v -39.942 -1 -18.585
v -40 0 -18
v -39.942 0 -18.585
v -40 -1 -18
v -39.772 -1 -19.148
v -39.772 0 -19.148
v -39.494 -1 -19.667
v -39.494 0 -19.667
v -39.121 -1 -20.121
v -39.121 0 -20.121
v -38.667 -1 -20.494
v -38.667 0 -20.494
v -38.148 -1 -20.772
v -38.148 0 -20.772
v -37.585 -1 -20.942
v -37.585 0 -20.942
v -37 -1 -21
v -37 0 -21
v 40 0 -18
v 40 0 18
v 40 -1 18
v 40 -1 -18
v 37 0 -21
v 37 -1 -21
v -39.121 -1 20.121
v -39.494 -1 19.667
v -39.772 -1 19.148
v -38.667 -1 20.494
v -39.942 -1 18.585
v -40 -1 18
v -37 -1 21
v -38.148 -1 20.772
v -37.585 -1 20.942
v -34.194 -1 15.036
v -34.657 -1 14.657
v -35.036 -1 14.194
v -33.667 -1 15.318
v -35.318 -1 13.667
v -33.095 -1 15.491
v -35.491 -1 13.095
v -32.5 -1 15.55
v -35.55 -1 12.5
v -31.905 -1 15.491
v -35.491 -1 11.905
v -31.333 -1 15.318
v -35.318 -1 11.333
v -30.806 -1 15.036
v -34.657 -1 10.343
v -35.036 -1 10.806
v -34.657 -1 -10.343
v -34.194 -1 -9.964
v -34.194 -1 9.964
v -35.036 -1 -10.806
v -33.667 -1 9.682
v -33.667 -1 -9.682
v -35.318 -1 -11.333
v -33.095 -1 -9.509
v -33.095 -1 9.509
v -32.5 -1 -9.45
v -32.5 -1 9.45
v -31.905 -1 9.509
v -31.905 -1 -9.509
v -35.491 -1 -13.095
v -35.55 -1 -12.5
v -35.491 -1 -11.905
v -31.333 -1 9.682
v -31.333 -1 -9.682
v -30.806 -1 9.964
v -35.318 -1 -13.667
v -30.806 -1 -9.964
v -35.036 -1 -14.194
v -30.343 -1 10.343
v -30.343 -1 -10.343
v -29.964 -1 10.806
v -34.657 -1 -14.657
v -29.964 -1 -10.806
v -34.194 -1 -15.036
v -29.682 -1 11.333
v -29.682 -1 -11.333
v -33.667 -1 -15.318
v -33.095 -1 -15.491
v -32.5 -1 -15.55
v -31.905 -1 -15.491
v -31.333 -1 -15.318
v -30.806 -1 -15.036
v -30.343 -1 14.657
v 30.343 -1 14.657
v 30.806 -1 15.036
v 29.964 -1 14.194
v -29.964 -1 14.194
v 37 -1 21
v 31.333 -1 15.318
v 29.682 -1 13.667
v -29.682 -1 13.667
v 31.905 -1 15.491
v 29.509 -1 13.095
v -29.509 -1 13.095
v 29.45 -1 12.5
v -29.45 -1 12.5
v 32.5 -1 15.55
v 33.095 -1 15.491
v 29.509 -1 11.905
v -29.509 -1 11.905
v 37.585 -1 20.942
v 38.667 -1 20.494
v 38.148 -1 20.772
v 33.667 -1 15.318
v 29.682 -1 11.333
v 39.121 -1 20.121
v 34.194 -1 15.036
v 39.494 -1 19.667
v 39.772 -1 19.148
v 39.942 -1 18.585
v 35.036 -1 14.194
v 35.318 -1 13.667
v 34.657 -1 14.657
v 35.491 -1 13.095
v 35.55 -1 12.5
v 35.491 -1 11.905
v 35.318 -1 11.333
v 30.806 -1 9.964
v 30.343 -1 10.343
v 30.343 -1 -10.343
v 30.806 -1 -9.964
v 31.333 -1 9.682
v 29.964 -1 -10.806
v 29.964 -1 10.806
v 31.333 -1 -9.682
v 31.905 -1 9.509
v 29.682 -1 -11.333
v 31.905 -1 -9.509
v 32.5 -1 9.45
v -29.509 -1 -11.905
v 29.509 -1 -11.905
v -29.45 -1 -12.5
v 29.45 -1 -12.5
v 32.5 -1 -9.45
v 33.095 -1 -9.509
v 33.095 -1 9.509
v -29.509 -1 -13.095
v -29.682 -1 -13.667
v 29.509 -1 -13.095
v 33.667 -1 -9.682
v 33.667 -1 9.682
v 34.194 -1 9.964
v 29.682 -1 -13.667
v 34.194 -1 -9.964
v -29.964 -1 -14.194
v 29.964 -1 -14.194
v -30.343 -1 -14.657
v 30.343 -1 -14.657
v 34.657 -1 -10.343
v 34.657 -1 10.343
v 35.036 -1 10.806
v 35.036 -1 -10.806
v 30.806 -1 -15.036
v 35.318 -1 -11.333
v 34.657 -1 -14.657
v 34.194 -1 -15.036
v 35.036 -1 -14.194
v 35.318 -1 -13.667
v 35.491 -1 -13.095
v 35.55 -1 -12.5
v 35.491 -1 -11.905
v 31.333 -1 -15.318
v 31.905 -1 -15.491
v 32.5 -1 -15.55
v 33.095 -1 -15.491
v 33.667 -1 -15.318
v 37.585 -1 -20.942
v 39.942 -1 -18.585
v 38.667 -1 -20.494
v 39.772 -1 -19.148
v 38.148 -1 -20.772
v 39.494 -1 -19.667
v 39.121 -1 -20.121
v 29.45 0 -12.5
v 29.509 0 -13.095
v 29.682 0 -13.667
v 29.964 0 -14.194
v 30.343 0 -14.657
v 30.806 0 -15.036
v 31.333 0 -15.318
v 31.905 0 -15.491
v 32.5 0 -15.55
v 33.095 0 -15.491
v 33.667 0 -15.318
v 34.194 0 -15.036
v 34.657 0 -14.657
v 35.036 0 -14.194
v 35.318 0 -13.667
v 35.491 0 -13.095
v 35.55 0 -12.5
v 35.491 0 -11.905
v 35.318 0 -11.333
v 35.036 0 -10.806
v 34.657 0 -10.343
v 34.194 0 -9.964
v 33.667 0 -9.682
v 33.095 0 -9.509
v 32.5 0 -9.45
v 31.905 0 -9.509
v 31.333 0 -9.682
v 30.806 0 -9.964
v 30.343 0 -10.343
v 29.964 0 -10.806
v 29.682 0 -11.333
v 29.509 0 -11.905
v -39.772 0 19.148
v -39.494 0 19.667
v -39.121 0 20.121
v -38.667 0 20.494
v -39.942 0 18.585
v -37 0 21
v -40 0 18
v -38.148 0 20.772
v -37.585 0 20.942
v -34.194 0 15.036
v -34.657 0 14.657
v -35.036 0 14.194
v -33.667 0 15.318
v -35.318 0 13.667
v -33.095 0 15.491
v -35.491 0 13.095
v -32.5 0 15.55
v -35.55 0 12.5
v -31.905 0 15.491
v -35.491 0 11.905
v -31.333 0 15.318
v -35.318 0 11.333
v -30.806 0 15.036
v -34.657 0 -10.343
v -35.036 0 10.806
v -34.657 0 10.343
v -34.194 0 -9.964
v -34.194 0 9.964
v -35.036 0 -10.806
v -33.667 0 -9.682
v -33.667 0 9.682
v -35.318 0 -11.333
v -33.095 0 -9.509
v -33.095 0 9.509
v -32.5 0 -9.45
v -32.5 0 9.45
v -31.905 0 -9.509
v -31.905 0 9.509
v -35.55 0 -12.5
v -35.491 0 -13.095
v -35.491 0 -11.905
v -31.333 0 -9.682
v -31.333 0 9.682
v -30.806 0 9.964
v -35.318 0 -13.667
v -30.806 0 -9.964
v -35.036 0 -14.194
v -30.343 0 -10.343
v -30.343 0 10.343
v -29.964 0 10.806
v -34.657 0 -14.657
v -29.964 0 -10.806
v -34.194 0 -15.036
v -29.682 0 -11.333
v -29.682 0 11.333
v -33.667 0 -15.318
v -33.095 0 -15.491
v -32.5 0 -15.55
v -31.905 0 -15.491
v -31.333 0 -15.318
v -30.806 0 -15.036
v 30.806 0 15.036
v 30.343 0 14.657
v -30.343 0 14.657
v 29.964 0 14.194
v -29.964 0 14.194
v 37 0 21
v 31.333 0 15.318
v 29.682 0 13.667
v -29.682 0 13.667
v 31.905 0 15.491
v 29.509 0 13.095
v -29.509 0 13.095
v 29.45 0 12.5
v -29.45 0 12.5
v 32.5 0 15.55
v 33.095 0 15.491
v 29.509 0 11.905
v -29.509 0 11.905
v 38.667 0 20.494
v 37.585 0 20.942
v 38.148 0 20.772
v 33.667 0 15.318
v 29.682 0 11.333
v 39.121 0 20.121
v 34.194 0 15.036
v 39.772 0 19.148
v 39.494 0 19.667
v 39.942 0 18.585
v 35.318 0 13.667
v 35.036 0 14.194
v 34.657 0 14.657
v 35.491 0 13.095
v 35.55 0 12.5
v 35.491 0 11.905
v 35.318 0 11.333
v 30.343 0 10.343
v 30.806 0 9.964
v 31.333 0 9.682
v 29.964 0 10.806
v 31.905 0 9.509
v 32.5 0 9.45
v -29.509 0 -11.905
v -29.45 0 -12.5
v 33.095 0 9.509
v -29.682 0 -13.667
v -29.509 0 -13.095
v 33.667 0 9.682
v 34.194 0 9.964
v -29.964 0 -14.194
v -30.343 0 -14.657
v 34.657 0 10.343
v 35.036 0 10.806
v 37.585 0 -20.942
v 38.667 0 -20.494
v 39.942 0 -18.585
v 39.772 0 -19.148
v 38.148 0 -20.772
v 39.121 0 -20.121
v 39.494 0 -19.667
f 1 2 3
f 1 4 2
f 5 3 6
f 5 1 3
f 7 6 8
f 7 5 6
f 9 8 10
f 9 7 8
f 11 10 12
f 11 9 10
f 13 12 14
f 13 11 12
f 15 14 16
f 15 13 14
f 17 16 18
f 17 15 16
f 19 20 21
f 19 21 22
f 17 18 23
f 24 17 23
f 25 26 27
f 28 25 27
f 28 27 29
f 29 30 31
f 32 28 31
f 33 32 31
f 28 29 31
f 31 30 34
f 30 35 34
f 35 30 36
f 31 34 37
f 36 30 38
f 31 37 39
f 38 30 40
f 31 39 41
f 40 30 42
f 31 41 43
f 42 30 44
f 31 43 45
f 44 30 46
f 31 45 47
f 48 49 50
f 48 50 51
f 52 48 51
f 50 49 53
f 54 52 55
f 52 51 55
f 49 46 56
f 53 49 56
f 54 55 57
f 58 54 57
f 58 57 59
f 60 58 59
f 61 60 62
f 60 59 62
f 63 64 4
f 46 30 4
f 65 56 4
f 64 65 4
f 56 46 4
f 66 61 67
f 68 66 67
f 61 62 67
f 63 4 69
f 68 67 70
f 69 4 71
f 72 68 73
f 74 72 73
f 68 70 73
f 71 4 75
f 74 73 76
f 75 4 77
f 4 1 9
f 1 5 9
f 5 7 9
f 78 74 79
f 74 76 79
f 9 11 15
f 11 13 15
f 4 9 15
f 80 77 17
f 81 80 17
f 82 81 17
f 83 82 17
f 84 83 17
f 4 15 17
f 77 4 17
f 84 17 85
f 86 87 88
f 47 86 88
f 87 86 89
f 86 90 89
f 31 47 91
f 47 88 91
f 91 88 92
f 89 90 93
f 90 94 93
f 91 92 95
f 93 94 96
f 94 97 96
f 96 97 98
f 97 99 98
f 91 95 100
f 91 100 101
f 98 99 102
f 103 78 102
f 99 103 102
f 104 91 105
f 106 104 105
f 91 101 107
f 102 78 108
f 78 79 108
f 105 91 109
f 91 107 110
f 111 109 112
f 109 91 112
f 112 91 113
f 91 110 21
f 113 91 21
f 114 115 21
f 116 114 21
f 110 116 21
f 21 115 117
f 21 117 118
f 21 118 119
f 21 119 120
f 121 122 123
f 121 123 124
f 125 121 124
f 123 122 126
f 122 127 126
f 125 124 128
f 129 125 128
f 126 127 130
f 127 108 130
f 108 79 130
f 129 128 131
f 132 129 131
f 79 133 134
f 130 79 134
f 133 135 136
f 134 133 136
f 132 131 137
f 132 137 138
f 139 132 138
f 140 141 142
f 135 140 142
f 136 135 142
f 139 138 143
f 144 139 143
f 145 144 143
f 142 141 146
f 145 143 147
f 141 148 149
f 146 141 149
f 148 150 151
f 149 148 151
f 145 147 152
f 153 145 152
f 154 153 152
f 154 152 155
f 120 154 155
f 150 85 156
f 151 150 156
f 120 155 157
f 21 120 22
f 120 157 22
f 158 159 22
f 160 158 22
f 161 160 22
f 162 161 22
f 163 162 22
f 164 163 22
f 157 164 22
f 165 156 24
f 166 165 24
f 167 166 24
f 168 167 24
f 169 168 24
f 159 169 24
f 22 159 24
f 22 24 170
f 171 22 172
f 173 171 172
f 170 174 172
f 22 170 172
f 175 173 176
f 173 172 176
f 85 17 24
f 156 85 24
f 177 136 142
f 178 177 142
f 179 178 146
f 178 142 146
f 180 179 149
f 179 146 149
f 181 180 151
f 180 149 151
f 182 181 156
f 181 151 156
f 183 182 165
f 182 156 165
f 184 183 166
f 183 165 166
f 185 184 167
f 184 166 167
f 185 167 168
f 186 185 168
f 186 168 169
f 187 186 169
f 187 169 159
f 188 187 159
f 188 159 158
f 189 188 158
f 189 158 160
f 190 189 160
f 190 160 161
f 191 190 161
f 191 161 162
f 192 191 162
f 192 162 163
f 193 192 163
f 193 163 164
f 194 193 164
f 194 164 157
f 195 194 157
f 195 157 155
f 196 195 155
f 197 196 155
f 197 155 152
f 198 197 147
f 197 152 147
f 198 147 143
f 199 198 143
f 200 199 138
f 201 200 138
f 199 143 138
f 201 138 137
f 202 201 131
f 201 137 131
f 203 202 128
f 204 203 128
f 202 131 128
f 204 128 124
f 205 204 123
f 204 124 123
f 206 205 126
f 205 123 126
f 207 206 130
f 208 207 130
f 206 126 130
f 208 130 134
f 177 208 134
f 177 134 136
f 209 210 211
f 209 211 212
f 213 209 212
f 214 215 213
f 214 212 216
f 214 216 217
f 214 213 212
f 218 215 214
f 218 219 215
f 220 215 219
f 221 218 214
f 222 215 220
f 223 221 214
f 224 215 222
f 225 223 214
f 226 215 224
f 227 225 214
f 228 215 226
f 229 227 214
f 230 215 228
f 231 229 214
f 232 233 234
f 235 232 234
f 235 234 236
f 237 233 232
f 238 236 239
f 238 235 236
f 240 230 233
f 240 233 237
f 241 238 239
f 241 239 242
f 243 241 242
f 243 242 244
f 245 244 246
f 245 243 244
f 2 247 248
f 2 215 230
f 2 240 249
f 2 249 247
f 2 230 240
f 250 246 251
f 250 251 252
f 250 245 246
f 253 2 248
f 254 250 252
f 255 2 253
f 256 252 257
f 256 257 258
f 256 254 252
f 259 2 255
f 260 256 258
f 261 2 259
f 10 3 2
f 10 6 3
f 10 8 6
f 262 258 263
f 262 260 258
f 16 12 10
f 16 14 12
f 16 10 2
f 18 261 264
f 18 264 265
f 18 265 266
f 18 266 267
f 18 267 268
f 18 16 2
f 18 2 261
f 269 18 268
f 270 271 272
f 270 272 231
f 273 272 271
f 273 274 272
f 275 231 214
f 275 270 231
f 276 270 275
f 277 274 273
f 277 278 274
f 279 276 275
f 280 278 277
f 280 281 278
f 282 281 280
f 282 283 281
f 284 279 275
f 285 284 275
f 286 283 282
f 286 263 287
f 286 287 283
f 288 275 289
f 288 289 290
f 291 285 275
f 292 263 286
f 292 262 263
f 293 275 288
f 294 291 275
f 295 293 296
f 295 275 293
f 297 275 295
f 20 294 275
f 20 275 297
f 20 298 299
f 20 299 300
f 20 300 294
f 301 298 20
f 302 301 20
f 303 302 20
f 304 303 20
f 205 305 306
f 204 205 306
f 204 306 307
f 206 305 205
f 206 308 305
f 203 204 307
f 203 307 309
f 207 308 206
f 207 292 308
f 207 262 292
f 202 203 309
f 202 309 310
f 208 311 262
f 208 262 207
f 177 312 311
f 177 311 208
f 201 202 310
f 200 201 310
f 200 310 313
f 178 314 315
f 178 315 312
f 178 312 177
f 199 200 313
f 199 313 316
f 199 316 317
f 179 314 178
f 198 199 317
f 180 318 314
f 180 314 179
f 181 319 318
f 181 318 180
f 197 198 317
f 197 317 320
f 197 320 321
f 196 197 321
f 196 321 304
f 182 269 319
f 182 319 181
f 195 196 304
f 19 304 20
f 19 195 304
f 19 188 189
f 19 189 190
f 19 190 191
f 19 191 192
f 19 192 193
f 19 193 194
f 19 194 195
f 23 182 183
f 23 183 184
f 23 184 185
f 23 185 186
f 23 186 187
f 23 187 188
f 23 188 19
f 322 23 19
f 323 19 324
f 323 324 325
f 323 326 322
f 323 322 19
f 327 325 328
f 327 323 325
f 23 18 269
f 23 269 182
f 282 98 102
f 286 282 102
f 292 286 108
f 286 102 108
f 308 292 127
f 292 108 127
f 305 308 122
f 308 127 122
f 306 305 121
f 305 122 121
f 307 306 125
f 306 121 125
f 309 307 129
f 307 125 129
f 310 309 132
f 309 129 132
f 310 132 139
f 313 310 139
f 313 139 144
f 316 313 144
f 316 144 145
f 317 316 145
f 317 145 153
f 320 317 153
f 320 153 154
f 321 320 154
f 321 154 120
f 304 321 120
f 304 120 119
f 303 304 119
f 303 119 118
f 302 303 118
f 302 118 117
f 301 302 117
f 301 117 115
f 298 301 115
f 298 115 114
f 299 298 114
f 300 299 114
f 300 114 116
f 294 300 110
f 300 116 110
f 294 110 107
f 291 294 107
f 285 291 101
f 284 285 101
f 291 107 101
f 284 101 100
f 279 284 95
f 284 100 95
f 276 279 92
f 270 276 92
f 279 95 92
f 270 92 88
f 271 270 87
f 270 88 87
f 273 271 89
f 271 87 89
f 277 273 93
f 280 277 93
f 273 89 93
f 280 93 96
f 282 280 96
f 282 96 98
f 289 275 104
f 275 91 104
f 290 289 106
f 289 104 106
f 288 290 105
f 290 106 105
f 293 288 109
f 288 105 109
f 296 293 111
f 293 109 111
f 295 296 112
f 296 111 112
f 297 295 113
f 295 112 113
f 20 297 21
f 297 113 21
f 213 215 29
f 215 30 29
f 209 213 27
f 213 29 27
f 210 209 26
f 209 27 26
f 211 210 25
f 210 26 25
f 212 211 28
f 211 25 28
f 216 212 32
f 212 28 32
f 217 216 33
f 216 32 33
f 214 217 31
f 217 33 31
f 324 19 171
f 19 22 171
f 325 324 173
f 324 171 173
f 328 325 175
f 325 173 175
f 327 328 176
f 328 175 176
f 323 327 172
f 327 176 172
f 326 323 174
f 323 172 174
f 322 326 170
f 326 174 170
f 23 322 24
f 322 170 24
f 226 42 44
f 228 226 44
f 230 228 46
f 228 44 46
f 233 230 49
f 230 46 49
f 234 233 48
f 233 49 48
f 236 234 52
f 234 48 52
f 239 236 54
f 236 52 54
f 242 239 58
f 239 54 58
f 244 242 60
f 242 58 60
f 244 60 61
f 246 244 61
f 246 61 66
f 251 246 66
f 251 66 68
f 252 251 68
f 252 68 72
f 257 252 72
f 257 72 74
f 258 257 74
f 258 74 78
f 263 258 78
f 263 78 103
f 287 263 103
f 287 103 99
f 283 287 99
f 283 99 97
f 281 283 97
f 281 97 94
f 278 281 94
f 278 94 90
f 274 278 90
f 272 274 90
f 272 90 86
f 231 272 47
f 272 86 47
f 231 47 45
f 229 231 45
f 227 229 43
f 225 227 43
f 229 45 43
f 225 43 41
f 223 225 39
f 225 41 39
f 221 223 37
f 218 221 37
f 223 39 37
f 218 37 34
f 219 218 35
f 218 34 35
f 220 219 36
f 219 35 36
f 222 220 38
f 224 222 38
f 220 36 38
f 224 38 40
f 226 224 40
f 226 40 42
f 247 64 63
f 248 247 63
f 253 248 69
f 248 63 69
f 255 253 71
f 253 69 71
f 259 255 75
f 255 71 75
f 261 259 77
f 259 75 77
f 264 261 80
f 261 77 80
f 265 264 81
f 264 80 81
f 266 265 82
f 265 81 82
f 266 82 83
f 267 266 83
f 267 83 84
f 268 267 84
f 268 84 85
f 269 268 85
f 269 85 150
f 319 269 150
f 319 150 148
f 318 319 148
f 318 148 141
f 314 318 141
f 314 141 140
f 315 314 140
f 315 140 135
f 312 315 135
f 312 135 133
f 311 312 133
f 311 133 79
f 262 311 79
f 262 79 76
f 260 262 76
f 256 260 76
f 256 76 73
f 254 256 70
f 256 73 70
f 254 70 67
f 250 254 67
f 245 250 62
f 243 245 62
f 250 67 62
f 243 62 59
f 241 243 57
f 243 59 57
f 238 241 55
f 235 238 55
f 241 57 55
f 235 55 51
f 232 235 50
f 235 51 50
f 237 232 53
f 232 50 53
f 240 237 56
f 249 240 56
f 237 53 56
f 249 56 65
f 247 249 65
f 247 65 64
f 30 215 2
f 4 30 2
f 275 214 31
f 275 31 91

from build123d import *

# Parameters (mm, degrees)
SKETCH_1_W              = 80
SKETCH_1_H              = 42
SM_BASE_FLANGE_1_DEPTH  = 1
FILLET_1_R              = 3
HOLE_WIZARD_6_2_6_2_1_D = 6.1


# Sheet-metal steps are written as plain solids
with BuildPart() as part:
    # Sketch 1 → Базовая кромка1 (new body)
    with BuildSketch(Plane(origin=(0, 0, 0), x_dir=(1, 0, 0), z_dir=(0, 1, 0))):
        Rectangle(SKETCH_1_W, SKETCH_1_H)
    extrude(amount=-SM_BASE_FLANGE_1_DEPTH)

    # Скругление1
    fillet_1_edges = [part.edges().sort_by_distance(p)[0] for p in [
        (40, -0.5, 21),
        (-40, -0.5, 21),
        (-40, -0.5, -21),
        (40, -0.5, -21),
    ]]
    fillet(fillet_1_edges, radius=FILLET_1_R)

    # Диаметр отверстия Ø6.2 (6.2)1 (through all)
    with Locations(Plane(origin=(0, 0, 0), x_dir=(1, 0, 0), z_dir=(0, 1, 0))):
        with Locations((-32.5, 12.5), (-32.5, -12.5), (32.5, -12.5), (32.5, 12.5)):
            Hole(HOLE_WIZARD_6_2_6_2_1_D / 2)


solid = part.part
